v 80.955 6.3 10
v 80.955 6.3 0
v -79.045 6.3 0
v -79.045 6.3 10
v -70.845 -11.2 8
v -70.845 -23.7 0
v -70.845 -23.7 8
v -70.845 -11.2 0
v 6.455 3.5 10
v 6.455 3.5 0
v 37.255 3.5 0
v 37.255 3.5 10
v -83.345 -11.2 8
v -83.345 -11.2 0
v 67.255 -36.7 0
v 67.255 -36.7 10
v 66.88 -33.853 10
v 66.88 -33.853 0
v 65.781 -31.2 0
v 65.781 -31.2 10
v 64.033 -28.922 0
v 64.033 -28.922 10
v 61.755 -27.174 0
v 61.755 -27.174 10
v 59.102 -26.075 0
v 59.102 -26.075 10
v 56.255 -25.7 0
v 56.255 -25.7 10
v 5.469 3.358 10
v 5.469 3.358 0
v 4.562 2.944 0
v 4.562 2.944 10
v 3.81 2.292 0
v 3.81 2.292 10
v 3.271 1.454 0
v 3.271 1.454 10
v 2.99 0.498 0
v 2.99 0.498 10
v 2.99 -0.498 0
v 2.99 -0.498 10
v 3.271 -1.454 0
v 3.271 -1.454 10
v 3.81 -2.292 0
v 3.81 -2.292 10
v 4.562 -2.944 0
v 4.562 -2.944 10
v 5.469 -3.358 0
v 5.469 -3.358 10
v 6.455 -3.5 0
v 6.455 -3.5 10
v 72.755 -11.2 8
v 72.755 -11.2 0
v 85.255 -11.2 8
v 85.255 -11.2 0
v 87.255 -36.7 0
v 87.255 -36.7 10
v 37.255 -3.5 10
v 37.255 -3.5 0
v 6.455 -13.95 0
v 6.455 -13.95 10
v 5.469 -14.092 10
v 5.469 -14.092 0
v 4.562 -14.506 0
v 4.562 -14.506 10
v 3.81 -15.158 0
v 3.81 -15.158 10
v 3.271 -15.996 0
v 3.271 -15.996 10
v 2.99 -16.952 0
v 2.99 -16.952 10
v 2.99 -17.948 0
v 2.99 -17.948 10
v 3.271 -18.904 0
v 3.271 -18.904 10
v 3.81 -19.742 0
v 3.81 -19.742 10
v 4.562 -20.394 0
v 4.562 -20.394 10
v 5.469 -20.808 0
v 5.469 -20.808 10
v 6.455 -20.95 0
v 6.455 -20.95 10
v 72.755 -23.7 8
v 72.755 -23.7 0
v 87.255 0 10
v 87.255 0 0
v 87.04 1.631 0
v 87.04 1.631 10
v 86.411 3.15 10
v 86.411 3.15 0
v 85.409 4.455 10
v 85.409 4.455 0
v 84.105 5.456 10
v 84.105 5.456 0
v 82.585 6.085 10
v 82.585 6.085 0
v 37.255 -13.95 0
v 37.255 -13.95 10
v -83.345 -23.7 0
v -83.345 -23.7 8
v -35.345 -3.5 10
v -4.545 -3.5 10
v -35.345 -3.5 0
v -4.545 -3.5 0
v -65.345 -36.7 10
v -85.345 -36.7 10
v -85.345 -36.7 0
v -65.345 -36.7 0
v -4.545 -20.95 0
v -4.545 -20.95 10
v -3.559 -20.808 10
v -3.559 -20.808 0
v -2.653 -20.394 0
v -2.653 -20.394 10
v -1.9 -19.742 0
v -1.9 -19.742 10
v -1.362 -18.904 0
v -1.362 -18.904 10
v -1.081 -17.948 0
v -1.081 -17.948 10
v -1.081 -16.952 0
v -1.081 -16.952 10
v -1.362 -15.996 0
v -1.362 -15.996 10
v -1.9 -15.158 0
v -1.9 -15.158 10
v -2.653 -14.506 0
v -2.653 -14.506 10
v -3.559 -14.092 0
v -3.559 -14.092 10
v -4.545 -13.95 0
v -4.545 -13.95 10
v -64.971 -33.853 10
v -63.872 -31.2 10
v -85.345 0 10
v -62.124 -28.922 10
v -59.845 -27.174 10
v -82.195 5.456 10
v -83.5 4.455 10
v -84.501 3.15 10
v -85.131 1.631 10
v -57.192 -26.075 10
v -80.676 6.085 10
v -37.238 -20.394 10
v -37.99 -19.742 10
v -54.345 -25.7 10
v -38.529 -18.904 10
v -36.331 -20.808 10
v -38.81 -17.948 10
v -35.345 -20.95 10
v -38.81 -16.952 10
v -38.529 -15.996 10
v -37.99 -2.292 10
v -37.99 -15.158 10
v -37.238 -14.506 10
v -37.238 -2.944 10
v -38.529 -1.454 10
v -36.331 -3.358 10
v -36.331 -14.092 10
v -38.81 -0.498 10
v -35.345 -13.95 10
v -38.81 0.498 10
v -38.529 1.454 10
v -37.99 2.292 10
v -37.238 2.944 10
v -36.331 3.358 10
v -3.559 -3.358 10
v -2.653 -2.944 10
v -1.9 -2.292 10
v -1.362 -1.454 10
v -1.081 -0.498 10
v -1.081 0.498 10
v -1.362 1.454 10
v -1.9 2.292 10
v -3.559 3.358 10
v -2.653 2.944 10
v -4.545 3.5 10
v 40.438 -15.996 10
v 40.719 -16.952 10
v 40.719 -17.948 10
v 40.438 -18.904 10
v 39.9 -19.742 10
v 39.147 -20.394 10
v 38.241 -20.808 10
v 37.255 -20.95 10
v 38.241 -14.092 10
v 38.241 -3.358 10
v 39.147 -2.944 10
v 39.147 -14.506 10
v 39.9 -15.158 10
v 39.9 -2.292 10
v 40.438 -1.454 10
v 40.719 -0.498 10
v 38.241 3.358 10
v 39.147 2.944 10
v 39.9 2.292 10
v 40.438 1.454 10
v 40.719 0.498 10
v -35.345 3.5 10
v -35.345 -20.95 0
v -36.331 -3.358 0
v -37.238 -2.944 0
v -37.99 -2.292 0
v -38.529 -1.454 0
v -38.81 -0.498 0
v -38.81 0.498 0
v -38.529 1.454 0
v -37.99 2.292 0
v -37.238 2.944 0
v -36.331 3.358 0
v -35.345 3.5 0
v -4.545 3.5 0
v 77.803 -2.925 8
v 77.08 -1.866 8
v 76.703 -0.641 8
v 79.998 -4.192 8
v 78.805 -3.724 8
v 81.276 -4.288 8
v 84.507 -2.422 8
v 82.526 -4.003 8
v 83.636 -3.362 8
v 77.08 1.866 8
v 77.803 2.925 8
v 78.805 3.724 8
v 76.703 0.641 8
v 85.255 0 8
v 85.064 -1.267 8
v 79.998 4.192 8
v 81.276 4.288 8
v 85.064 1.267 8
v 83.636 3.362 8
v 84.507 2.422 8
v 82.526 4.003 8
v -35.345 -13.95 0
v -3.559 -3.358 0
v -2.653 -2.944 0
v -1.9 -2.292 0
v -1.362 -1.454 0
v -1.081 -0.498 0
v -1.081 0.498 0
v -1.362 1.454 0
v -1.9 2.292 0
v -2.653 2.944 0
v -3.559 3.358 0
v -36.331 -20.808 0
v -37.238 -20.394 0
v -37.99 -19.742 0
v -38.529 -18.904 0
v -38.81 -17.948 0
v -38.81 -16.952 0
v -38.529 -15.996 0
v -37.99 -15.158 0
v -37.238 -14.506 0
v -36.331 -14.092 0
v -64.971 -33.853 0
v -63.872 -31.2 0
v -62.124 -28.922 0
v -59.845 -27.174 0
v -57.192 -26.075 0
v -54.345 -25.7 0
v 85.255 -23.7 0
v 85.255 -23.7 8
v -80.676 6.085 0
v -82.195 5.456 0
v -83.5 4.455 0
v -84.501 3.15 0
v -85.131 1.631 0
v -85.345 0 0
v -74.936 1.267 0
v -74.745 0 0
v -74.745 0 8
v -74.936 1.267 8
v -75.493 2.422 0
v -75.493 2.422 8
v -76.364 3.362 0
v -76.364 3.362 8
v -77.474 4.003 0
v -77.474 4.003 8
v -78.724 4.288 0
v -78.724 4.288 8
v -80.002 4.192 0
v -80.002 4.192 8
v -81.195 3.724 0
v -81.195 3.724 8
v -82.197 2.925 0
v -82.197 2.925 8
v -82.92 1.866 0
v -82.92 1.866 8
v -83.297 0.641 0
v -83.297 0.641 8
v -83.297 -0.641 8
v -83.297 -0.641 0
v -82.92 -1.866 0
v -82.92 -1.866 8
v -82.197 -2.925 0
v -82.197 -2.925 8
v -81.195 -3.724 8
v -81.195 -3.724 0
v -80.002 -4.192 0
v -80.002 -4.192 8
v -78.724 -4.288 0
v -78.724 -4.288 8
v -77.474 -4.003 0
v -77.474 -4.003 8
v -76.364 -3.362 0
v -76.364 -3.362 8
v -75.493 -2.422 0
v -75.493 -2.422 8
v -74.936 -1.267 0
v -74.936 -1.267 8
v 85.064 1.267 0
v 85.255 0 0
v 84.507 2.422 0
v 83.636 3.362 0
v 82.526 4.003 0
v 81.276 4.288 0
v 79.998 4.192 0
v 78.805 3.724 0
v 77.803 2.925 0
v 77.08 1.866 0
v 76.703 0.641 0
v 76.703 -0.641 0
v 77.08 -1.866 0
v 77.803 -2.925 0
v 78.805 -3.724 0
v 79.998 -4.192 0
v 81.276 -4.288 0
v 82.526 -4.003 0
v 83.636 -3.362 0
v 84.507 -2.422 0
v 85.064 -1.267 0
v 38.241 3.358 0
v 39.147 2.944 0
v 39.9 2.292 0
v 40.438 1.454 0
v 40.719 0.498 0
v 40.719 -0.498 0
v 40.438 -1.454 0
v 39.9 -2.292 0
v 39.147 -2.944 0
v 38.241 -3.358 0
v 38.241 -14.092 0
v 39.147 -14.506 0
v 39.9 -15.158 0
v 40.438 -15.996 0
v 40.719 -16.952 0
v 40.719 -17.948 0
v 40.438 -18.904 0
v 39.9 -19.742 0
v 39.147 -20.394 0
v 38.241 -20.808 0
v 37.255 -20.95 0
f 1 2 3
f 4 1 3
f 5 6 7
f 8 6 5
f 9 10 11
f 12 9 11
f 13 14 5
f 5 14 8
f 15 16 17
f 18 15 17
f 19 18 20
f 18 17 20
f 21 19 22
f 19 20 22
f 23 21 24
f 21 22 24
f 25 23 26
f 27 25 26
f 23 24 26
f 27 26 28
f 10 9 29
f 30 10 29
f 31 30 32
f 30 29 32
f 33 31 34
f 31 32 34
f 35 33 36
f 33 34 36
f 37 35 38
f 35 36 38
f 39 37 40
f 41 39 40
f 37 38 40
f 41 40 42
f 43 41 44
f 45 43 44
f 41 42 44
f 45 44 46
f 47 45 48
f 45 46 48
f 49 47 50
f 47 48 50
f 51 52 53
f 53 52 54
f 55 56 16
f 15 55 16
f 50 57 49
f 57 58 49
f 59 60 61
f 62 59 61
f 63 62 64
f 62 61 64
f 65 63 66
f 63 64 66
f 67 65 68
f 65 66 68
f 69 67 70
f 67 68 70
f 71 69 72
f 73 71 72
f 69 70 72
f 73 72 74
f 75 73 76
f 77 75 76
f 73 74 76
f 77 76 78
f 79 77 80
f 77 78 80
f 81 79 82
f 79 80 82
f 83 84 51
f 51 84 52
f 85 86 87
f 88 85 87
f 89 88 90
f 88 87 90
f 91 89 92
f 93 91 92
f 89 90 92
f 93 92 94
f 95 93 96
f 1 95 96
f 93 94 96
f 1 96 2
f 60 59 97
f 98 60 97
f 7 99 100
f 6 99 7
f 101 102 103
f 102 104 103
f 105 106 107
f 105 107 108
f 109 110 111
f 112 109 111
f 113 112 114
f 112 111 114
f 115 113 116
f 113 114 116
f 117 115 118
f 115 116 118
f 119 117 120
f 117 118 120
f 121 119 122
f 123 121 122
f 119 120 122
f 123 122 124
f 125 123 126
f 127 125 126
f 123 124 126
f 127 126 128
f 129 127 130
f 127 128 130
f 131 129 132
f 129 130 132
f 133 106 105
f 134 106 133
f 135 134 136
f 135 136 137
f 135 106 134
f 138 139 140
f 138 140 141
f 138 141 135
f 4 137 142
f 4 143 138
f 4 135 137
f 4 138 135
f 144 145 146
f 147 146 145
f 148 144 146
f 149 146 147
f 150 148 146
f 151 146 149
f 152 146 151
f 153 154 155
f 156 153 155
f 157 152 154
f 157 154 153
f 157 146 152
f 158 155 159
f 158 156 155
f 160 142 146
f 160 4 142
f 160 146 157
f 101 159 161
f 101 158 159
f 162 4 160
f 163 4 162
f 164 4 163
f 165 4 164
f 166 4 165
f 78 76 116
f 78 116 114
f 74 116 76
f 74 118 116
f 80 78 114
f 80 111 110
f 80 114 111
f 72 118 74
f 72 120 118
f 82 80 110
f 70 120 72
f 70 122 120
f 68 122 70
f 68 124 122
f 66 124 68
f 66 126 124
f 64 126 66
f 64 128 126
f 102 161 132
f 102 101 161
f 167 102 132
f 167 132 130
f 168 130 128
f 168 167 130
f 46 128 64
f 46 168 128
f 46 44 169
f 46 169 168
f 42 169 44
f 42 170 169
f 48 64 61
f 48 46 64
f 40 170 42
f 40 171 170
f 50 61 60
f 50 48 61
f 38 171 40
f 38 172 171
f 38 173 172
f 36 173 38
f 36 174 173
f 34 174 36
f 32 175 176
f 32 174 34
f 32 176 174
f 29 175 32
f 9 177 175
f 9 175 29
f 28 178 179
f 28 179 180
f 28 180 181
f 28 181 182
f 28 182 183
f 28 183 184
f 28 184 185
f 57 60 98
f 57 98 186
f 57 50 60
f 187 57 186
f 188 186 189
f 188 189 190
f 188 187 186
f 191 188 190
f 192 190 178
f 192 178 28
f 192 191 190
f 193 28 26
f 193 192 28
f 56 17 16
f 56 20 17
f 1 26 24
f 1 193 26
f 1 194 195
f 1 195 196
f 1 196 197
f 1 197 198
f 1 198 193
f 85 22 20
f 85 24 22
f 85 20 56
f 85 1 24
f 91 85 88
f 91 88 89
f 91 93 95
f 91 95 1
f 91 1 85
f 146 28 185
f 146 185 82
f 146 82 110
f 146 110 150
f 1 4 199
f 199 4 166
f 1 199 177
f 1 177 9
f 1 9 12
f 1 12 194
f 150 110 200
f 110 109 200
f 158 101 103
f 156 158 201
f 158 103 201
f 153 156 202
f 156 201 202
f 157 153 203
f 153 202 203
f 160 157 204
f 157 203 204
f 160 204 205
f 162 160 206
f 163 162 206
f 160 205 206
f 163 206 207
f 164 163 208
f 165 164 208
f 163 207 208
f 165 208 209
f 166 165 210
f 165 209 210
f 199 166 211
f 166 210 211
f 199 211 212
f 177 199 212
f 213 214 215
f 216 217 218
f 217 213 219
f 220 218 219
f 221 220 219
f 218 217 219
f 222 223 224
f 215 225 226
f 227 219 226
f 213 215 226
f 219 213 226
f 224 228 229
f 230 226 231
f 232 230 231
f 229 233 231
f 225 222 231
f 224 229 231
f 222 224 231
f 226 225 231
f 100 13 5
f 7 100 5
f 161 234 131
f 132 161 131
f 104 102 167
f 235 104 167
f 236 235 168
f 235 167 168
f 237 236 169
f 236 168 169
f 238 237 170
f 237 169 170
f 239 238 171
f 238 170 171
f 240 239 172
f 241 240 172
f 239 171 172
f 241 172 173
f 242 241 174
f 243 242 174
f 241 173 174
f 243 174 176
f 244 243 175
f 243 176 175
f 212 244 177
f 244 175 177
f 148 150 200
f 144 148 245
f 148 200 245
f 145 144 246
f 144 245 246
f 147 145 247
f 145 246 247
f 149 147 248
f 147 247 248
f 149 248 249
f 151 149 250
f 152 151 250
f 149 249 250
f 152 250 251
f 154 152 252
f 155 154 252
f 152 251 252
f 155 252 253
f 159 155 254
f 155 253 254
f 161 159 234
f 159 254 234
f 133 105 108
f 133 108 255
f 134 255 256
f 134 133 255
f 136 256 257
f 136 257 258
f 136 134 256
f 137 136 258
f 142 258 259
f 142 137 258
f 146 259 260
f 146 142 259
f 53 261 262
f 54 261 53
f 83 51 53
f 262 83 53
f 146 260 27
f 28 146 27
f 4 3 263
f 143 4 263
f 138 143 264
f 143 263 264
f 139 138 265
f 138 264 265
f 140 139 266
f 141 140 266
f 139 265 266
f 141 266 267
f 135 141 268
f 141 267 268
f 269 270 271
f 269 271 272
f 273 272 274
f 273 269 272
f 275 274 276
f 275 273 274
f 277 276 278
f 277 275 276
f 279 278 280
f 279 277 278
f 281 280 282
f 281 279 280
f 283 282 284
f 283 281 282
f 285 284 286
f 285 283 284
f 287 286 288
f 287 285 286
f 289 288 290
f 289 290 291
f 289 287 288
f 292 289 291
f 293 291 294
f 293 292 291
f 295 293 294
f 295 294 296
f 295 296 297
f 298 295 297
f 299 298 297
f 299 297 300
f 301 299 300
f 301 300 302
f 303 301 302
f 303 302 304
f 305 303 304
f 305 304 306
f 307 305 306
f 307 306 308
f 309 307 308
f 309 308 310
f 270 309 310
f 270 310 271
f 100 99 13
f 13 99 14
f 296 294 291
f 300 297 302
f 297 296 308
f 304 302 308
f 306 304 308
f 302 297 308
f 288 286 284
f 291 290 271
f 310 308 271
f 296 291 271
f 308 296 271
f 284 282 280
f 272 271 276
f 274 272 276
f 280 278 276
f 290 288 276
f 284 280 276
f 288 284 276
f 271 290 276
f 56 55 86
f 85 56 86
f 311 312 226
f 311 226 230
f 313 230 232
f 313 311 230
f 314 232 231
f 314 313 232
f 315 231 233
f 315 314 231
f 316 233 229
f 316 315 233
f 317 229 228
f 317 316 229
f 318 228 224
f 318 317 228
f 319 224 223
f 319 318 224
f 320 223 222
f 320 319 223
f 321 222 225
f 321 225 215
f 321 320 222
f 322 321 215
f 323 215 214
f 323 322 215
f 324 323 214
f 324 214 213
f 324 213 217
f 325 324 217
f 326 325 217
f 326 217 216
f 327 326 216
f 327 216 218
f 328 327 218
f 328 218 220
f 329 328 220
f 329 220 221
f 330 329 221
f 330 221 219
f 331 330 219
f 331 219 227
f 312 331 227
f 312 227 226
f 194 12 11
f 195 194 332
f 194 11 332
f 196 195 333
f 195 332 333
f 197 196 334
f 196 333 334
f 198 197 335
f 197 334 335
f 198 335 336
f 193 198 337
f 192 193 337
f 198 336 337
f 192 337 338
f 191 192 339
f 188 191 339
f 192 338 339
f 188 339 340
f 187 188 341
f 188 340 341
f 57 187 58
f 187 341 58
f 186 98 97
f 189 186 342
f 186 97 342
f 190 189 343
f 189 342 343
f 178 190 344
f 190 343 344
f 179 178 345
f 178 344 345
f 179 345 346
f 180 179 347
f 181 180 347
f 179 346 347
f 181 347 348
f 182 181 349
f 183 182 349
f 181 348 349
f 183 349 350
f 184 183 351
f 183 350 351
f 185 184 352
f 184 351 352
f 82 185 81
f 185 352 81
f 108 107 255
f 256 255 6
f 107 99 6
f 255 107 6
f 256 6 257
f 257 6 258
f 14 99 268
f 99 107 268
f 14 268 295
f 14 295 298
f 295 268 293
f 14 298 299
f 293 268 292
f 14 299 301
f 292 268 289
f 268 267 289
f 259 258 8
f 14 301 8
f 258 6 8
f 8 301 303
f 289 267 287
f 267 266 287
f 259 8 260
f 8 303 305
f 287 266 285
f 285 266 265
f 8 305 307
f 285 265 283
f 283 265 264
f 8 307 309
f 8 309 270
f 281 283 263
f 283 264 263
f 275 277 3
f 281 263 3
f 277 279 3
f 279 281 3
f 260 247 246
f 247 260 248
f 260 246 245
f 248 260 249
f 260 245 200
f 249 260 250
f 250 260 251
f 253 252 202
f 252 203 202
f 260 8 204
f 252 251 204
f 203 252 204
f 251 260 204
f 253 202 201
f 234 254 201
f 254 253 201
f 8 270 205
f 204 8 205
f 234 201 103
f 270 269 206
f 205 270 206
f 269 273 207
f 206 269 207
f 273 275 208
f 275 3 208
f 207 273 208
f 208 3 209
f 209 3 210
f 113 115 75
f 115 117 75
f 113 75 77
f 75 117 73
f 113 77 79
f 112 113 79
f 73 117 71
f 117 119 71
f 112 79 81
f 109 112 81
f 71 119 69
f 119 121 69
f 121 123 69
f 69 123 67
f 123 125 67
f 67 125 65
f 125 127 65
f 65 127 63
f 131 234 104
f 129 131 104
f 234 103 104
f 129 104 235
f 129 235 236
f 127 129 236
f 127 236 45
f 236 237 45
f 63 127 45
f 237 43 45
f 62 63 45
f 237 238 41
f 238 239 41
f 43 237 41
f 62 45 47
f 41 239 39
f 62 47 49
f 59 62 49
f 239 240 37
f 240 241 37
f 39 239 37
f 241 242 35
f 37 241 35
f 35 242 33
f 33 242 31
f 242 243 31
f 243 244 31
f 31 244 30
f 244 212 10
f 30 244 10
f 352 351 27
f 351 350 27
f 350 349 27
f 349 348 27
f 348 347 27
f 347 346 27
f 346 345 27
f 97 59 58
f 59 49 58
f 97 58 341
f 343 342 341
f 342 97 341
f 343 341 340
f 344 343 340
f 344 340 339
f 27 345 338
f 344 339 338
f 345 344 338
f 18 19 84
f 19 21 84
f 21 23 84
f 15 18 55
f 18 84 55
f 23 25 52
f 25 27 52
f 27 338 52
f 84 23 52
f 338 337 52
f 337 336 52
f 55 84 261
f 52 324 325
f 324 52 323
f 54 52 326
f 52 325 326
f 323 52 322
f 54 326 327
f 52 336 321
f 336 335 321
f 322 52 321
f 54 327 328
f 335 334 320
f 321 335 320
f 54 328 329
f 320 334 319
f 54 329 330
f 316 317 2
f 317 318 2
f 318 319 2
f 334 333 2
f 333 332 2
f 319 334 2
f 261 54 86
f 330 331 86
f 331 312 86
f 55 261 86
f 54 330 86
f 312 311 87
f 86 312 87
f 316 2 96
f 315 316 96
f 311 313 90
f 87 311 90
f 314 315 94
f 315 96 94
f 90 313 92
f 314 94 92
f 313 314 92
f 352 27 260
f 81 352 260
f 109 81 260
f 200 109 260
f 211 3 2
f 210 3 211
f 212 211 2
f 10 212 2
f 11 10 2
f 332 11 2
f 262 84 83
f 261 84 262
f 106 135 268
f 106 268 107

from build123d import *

# Parameters (mm, degrees)
SKETCH1_R               = 4.3
SKETCH1_W               = 12.5
SKETCH1_H               = 12.5
BOSS_EXTRUDE1_DEPTH     = 8
CUT_EXTRUDE1_DEPTH      = 8
SKETCH1_2_R             = 4.3
SKETCH1_2_W             = 12.5
SKETCH1_2_H             = 12.5
BOSS_EXTRUDE2_DEPTH     = 10
CUT_EXTRUDE2_DEPTH      = 3
CUT_EXTRUDE2_DEPTH_BACK = 9
SKETCH3_W               = 12.5
SKETCH3_H               = 12.5
BOSS_EXTRUDE3_DEPTH     = 2
SKETCH4_R               = 4.3
BOSS_EXTRUDE5_DEPTH     = 2
BOSS_EXTRUDE6_DEPTH     = 10
BOSS_EXTRUDE7_DEPTH     = 10
BOSS_EXTRUDE8_DEPTH     = 10


with BuildPart() as part:
    # Sketch1 → Boss-Extrude1 (new body)
    with BuildSketch(Plane.XY):
        with BuildLine():
            Line((-85.345346062, -25.7), (87.254653938, -25.7))
            Line((87.254653938, -25.7), (87.254653938, 0))
            ThreePointArc((87.254653938, 0), (85.409426659, 4.454772721), (80.954653938, 6.3))
            Line((80.954653938, 6.3), (-79.045346062, 6.3))
            ThreePointArc((-79.045346062, 6.3), (-83.500118784, 4.454772721), (-85.345346062, 0))
            Line((-85.345346062, 0), (-85.345346062, -25.7))
        make_face()
        with Locations((-79.045346062, 0)):
            Circle(SKETCH1_R, mode=Mode.SUBTRACT)
        with Locations((80.954653938, 0)):
            Circle(SKETCH1_R, mode=Mode.SUBTRACT)
        with Locations((-77.095346062, -17.45)):
            Rectangle(SKETCH1_W, SKETCH1_H, mode=Mode.SUBTRACT)
        with Locations((79.004653938, -17.45)):
            Rectangle(SKETCH1_W, SKETCH1_H, mode=Mode.SUBTRACT)
    extrude(amount=BOSS_EXTRUDE1_DEPTH)

    # Sketch2 → Cut-Extrude1 (cut)
    with BuildSketch(Plane.XY.offset(8)):
        with BuildLine():
            Line((-35.345346062, 3.5), (37.254653938, 3.5))
            ThreePointArc((37.254653938, 3.5), (40.754653938, 0), (37.254653938, -3.5))
            Line((37.254653938, -3.5), (-35.345346062, -3.5))
            ThreePointArc((-35.345346062, -3.5), (-38.845346062, 0), (-35.345346062, 3.5))
        make_face()
        with BuildLine():
            Line((-35.345346062, -13.95), (37.254653938, -13.95))
            ThreePointArc((37.254653938, -13.95), (40.754653938, -17.45), (37.254653938, -20.95))
            Line((37.254653938, -20.95), (34.643207431, -20.95))
            Line((34.643207431, -20.95), (-35.345346062, -20.95))
            ThreePointArc((-35.345346062, -20.95), (-38.845346062, -17.45), (-35.345346062, -13.95))
        make_face()
    extrude(amount=-CUT_EXTRUDE1_DEPTH, mode=Mode.SUBTRACT)

    # Sketch1<2> → Boss-Extrude2 (add)
    with BuildSketch(Plane.XY):
        with BuildLine():
            Line((-85.345346062, -25.7), (87.254653938, -25.7))
            Line((87.254653938, -25.7), (87.254653938, 0))
            ThreePointArc((87.254653938, 0), (85.409426659, 4.454772721), (80.954653938, 6.3))
            Line((80.954653938, 6.3), (-79.045346062, 6.3))
            ThreePointArc((-79.045346062, 6.3), (-83.500118784, 4.454772721), (-85.345346062, 0))
            Line((-85.345346062, 0), (-85.345346062, -25.7))
        make_face()
        with Locations((-79.045346062, 0)):
            Circle(SKETCH1_2_R, mode=Mode.SUBTRACT)
        with Locations((80.954653938, 0)):
            Circle(SKETCH1_2_R, mode=Mode.SUBTRACT)
        with Locations((-77.095346062, -17.45)):
            Rectangle(SKETCH1_2_W, SKETCH1_2_H, mode=Mode.SUBTRACT)
        with Locations((79.004653938, -17.45)):
            Rectangle(SKETCH1_2_W, SKETCH1_2_H, mode=Mode.SUBTRACT)
    extrude(amount=BOSS_EXTRUDE2_DEPTH)

    # Sketch2<2> → Cut-Extrude2 (cut, two sides)
    with BuildSketch(Plane.XY.offset(8)) as cut_extrude2_sk:
        with BuildLine():
            Line((-35.345346062, 3.5), (37.254653938, 3.5))
            ThreePointArc((37.254653938, 3.5), (40.754653938, 0), (37.254653938, -3.5))
            Line((37.254653938, -3.5), (-35.345346062, -3.5))
            ThreePointArc((-35.345346062, -3.5), (-38.845346062, 0), (-35.345346062, 3.5))
        make_face()
        with BuildLine():
            Line((-35.345346062, -13.95), (37.254653938, -13.95))
            ThreePointArc((37.254653938, -13.95), (40.754653938, -17.45), (37.254653938, -20.95))
            Line((37.254653938, -20.95), (34.643207431, -20.95))
            Line((34.643207431, -20.95), (-35.345346062, -20.95))
            ThreePointArc((-35.345346062, -20.95), (-38.845346062, -17.45), (-35.345346062, -13.95))
        make_face()
    extrude(amount=CUT_EXTRUDE2_DEPTH, mode=Mode.SUBTRACT)
    extrude(cut_extrude2_sk.sketch, amount=-CUT_EXTRUDE2_DEPTH_BACK, mode=Mode.SUBTRACT)

    # Sketch3 → Boss-Extrude3 (add)
    with BuildSketch(Plane.XY.offset(10)):
        with Locations((-77.095346062, -17.45)):
            Rectangle(SKETCH3_W, SKETCH3_H)
        with Locations((79.004653938, -17.45)):
            Rectangle(SKETCH3_W, SKETCH3_H)
    extrude(amount=-BOSS_EXTRUDE3_DEPTH)

    # Sketch4 → Boss-Extrude5 (add)
    with BuildSketch(Plane.XY.offset(10)):
        with Locations((-79.045346062, 0)):
            Circle(SKETCH4_R)
        with Locations((80.954653938, 0)):
            Circle(SKETCH4_R)
    extrude(amount=-BOSS_EXTRUDE5_DEPTH)

    # Sketch5 → Boss-Extrude6 (add)
    with BuildSketch(Plane.XY.offset(10)):
        with BuildLine():
            Line((-4.545346062, 3.5), (6.454653938, 3.5))
            ThreePointArc((6.454653938, 3.5), (2.954653938, 0), (6.454653938, -3.5))
            Line((6.454653938, -3.5), (-4.545346062, -3.5))
            ThreePointArc((-4.545346062, -3.5), (-1.045346062, 0), (-4.545346062, 3.5))
        make_face()
    extrude(amount=-BOSS_EXTRUDE6_DEPTH)

    # Sketch6 → Boss-Extrude7 (add)
    with BuildSketch(Plane.XY.offset(10)):
        with BuildLine():
            Line((-4.545346062, -13.95), (6.454653938, -13.95))
            ThreePointArc((6.454653938, -13.95), (2.954653938, -17.45), (6.454653938, -20.95))
            Line((6.454653938, -20.95), (-4.545346062, -20.95))
            ThreePointArc((-4.545346062, -20.95), (-1.045346062, -17.45), (-4.545346062, -13.95))
        make_face()
    extrude(amount=-BOSS_EXTRUDE7_DEPTH)

    # Sketch7 → Boss-Extrude8 (add)
    with BuildSketch(Plane.XY.offset(10)):
        with BuildLine():
            Line((-85.345346062, -25.7), (-85.345346062, -36.7))
            Line((-85.345346062, -36.7), (-65.345346062, -36.7))
            ThreePointArc((-65.345346062, -36.7), (-62.123520655, -28.921825407), (-54.345346062, -25.7))
            Line((-54.345346062, -25.7), (-85.345346062, -25.7))
        make_face()
        with BuildLine():
            Line((87.254653938, -25.7), (87.254653938, -36.7))
            Line((87.254653938, -36.7), (67.254653938, -36.7))
            ThreePointArc((67.254653938, -36.7), (64.032828531, -28.921825407), (56.254653938, -25.7))
            Line((56.254653938, -25.7), (87.254653938, -25.7))
        make_face()
    extrude(amount=-BOSS_EXTRUDE8_DEPTH)


solid = part.part
